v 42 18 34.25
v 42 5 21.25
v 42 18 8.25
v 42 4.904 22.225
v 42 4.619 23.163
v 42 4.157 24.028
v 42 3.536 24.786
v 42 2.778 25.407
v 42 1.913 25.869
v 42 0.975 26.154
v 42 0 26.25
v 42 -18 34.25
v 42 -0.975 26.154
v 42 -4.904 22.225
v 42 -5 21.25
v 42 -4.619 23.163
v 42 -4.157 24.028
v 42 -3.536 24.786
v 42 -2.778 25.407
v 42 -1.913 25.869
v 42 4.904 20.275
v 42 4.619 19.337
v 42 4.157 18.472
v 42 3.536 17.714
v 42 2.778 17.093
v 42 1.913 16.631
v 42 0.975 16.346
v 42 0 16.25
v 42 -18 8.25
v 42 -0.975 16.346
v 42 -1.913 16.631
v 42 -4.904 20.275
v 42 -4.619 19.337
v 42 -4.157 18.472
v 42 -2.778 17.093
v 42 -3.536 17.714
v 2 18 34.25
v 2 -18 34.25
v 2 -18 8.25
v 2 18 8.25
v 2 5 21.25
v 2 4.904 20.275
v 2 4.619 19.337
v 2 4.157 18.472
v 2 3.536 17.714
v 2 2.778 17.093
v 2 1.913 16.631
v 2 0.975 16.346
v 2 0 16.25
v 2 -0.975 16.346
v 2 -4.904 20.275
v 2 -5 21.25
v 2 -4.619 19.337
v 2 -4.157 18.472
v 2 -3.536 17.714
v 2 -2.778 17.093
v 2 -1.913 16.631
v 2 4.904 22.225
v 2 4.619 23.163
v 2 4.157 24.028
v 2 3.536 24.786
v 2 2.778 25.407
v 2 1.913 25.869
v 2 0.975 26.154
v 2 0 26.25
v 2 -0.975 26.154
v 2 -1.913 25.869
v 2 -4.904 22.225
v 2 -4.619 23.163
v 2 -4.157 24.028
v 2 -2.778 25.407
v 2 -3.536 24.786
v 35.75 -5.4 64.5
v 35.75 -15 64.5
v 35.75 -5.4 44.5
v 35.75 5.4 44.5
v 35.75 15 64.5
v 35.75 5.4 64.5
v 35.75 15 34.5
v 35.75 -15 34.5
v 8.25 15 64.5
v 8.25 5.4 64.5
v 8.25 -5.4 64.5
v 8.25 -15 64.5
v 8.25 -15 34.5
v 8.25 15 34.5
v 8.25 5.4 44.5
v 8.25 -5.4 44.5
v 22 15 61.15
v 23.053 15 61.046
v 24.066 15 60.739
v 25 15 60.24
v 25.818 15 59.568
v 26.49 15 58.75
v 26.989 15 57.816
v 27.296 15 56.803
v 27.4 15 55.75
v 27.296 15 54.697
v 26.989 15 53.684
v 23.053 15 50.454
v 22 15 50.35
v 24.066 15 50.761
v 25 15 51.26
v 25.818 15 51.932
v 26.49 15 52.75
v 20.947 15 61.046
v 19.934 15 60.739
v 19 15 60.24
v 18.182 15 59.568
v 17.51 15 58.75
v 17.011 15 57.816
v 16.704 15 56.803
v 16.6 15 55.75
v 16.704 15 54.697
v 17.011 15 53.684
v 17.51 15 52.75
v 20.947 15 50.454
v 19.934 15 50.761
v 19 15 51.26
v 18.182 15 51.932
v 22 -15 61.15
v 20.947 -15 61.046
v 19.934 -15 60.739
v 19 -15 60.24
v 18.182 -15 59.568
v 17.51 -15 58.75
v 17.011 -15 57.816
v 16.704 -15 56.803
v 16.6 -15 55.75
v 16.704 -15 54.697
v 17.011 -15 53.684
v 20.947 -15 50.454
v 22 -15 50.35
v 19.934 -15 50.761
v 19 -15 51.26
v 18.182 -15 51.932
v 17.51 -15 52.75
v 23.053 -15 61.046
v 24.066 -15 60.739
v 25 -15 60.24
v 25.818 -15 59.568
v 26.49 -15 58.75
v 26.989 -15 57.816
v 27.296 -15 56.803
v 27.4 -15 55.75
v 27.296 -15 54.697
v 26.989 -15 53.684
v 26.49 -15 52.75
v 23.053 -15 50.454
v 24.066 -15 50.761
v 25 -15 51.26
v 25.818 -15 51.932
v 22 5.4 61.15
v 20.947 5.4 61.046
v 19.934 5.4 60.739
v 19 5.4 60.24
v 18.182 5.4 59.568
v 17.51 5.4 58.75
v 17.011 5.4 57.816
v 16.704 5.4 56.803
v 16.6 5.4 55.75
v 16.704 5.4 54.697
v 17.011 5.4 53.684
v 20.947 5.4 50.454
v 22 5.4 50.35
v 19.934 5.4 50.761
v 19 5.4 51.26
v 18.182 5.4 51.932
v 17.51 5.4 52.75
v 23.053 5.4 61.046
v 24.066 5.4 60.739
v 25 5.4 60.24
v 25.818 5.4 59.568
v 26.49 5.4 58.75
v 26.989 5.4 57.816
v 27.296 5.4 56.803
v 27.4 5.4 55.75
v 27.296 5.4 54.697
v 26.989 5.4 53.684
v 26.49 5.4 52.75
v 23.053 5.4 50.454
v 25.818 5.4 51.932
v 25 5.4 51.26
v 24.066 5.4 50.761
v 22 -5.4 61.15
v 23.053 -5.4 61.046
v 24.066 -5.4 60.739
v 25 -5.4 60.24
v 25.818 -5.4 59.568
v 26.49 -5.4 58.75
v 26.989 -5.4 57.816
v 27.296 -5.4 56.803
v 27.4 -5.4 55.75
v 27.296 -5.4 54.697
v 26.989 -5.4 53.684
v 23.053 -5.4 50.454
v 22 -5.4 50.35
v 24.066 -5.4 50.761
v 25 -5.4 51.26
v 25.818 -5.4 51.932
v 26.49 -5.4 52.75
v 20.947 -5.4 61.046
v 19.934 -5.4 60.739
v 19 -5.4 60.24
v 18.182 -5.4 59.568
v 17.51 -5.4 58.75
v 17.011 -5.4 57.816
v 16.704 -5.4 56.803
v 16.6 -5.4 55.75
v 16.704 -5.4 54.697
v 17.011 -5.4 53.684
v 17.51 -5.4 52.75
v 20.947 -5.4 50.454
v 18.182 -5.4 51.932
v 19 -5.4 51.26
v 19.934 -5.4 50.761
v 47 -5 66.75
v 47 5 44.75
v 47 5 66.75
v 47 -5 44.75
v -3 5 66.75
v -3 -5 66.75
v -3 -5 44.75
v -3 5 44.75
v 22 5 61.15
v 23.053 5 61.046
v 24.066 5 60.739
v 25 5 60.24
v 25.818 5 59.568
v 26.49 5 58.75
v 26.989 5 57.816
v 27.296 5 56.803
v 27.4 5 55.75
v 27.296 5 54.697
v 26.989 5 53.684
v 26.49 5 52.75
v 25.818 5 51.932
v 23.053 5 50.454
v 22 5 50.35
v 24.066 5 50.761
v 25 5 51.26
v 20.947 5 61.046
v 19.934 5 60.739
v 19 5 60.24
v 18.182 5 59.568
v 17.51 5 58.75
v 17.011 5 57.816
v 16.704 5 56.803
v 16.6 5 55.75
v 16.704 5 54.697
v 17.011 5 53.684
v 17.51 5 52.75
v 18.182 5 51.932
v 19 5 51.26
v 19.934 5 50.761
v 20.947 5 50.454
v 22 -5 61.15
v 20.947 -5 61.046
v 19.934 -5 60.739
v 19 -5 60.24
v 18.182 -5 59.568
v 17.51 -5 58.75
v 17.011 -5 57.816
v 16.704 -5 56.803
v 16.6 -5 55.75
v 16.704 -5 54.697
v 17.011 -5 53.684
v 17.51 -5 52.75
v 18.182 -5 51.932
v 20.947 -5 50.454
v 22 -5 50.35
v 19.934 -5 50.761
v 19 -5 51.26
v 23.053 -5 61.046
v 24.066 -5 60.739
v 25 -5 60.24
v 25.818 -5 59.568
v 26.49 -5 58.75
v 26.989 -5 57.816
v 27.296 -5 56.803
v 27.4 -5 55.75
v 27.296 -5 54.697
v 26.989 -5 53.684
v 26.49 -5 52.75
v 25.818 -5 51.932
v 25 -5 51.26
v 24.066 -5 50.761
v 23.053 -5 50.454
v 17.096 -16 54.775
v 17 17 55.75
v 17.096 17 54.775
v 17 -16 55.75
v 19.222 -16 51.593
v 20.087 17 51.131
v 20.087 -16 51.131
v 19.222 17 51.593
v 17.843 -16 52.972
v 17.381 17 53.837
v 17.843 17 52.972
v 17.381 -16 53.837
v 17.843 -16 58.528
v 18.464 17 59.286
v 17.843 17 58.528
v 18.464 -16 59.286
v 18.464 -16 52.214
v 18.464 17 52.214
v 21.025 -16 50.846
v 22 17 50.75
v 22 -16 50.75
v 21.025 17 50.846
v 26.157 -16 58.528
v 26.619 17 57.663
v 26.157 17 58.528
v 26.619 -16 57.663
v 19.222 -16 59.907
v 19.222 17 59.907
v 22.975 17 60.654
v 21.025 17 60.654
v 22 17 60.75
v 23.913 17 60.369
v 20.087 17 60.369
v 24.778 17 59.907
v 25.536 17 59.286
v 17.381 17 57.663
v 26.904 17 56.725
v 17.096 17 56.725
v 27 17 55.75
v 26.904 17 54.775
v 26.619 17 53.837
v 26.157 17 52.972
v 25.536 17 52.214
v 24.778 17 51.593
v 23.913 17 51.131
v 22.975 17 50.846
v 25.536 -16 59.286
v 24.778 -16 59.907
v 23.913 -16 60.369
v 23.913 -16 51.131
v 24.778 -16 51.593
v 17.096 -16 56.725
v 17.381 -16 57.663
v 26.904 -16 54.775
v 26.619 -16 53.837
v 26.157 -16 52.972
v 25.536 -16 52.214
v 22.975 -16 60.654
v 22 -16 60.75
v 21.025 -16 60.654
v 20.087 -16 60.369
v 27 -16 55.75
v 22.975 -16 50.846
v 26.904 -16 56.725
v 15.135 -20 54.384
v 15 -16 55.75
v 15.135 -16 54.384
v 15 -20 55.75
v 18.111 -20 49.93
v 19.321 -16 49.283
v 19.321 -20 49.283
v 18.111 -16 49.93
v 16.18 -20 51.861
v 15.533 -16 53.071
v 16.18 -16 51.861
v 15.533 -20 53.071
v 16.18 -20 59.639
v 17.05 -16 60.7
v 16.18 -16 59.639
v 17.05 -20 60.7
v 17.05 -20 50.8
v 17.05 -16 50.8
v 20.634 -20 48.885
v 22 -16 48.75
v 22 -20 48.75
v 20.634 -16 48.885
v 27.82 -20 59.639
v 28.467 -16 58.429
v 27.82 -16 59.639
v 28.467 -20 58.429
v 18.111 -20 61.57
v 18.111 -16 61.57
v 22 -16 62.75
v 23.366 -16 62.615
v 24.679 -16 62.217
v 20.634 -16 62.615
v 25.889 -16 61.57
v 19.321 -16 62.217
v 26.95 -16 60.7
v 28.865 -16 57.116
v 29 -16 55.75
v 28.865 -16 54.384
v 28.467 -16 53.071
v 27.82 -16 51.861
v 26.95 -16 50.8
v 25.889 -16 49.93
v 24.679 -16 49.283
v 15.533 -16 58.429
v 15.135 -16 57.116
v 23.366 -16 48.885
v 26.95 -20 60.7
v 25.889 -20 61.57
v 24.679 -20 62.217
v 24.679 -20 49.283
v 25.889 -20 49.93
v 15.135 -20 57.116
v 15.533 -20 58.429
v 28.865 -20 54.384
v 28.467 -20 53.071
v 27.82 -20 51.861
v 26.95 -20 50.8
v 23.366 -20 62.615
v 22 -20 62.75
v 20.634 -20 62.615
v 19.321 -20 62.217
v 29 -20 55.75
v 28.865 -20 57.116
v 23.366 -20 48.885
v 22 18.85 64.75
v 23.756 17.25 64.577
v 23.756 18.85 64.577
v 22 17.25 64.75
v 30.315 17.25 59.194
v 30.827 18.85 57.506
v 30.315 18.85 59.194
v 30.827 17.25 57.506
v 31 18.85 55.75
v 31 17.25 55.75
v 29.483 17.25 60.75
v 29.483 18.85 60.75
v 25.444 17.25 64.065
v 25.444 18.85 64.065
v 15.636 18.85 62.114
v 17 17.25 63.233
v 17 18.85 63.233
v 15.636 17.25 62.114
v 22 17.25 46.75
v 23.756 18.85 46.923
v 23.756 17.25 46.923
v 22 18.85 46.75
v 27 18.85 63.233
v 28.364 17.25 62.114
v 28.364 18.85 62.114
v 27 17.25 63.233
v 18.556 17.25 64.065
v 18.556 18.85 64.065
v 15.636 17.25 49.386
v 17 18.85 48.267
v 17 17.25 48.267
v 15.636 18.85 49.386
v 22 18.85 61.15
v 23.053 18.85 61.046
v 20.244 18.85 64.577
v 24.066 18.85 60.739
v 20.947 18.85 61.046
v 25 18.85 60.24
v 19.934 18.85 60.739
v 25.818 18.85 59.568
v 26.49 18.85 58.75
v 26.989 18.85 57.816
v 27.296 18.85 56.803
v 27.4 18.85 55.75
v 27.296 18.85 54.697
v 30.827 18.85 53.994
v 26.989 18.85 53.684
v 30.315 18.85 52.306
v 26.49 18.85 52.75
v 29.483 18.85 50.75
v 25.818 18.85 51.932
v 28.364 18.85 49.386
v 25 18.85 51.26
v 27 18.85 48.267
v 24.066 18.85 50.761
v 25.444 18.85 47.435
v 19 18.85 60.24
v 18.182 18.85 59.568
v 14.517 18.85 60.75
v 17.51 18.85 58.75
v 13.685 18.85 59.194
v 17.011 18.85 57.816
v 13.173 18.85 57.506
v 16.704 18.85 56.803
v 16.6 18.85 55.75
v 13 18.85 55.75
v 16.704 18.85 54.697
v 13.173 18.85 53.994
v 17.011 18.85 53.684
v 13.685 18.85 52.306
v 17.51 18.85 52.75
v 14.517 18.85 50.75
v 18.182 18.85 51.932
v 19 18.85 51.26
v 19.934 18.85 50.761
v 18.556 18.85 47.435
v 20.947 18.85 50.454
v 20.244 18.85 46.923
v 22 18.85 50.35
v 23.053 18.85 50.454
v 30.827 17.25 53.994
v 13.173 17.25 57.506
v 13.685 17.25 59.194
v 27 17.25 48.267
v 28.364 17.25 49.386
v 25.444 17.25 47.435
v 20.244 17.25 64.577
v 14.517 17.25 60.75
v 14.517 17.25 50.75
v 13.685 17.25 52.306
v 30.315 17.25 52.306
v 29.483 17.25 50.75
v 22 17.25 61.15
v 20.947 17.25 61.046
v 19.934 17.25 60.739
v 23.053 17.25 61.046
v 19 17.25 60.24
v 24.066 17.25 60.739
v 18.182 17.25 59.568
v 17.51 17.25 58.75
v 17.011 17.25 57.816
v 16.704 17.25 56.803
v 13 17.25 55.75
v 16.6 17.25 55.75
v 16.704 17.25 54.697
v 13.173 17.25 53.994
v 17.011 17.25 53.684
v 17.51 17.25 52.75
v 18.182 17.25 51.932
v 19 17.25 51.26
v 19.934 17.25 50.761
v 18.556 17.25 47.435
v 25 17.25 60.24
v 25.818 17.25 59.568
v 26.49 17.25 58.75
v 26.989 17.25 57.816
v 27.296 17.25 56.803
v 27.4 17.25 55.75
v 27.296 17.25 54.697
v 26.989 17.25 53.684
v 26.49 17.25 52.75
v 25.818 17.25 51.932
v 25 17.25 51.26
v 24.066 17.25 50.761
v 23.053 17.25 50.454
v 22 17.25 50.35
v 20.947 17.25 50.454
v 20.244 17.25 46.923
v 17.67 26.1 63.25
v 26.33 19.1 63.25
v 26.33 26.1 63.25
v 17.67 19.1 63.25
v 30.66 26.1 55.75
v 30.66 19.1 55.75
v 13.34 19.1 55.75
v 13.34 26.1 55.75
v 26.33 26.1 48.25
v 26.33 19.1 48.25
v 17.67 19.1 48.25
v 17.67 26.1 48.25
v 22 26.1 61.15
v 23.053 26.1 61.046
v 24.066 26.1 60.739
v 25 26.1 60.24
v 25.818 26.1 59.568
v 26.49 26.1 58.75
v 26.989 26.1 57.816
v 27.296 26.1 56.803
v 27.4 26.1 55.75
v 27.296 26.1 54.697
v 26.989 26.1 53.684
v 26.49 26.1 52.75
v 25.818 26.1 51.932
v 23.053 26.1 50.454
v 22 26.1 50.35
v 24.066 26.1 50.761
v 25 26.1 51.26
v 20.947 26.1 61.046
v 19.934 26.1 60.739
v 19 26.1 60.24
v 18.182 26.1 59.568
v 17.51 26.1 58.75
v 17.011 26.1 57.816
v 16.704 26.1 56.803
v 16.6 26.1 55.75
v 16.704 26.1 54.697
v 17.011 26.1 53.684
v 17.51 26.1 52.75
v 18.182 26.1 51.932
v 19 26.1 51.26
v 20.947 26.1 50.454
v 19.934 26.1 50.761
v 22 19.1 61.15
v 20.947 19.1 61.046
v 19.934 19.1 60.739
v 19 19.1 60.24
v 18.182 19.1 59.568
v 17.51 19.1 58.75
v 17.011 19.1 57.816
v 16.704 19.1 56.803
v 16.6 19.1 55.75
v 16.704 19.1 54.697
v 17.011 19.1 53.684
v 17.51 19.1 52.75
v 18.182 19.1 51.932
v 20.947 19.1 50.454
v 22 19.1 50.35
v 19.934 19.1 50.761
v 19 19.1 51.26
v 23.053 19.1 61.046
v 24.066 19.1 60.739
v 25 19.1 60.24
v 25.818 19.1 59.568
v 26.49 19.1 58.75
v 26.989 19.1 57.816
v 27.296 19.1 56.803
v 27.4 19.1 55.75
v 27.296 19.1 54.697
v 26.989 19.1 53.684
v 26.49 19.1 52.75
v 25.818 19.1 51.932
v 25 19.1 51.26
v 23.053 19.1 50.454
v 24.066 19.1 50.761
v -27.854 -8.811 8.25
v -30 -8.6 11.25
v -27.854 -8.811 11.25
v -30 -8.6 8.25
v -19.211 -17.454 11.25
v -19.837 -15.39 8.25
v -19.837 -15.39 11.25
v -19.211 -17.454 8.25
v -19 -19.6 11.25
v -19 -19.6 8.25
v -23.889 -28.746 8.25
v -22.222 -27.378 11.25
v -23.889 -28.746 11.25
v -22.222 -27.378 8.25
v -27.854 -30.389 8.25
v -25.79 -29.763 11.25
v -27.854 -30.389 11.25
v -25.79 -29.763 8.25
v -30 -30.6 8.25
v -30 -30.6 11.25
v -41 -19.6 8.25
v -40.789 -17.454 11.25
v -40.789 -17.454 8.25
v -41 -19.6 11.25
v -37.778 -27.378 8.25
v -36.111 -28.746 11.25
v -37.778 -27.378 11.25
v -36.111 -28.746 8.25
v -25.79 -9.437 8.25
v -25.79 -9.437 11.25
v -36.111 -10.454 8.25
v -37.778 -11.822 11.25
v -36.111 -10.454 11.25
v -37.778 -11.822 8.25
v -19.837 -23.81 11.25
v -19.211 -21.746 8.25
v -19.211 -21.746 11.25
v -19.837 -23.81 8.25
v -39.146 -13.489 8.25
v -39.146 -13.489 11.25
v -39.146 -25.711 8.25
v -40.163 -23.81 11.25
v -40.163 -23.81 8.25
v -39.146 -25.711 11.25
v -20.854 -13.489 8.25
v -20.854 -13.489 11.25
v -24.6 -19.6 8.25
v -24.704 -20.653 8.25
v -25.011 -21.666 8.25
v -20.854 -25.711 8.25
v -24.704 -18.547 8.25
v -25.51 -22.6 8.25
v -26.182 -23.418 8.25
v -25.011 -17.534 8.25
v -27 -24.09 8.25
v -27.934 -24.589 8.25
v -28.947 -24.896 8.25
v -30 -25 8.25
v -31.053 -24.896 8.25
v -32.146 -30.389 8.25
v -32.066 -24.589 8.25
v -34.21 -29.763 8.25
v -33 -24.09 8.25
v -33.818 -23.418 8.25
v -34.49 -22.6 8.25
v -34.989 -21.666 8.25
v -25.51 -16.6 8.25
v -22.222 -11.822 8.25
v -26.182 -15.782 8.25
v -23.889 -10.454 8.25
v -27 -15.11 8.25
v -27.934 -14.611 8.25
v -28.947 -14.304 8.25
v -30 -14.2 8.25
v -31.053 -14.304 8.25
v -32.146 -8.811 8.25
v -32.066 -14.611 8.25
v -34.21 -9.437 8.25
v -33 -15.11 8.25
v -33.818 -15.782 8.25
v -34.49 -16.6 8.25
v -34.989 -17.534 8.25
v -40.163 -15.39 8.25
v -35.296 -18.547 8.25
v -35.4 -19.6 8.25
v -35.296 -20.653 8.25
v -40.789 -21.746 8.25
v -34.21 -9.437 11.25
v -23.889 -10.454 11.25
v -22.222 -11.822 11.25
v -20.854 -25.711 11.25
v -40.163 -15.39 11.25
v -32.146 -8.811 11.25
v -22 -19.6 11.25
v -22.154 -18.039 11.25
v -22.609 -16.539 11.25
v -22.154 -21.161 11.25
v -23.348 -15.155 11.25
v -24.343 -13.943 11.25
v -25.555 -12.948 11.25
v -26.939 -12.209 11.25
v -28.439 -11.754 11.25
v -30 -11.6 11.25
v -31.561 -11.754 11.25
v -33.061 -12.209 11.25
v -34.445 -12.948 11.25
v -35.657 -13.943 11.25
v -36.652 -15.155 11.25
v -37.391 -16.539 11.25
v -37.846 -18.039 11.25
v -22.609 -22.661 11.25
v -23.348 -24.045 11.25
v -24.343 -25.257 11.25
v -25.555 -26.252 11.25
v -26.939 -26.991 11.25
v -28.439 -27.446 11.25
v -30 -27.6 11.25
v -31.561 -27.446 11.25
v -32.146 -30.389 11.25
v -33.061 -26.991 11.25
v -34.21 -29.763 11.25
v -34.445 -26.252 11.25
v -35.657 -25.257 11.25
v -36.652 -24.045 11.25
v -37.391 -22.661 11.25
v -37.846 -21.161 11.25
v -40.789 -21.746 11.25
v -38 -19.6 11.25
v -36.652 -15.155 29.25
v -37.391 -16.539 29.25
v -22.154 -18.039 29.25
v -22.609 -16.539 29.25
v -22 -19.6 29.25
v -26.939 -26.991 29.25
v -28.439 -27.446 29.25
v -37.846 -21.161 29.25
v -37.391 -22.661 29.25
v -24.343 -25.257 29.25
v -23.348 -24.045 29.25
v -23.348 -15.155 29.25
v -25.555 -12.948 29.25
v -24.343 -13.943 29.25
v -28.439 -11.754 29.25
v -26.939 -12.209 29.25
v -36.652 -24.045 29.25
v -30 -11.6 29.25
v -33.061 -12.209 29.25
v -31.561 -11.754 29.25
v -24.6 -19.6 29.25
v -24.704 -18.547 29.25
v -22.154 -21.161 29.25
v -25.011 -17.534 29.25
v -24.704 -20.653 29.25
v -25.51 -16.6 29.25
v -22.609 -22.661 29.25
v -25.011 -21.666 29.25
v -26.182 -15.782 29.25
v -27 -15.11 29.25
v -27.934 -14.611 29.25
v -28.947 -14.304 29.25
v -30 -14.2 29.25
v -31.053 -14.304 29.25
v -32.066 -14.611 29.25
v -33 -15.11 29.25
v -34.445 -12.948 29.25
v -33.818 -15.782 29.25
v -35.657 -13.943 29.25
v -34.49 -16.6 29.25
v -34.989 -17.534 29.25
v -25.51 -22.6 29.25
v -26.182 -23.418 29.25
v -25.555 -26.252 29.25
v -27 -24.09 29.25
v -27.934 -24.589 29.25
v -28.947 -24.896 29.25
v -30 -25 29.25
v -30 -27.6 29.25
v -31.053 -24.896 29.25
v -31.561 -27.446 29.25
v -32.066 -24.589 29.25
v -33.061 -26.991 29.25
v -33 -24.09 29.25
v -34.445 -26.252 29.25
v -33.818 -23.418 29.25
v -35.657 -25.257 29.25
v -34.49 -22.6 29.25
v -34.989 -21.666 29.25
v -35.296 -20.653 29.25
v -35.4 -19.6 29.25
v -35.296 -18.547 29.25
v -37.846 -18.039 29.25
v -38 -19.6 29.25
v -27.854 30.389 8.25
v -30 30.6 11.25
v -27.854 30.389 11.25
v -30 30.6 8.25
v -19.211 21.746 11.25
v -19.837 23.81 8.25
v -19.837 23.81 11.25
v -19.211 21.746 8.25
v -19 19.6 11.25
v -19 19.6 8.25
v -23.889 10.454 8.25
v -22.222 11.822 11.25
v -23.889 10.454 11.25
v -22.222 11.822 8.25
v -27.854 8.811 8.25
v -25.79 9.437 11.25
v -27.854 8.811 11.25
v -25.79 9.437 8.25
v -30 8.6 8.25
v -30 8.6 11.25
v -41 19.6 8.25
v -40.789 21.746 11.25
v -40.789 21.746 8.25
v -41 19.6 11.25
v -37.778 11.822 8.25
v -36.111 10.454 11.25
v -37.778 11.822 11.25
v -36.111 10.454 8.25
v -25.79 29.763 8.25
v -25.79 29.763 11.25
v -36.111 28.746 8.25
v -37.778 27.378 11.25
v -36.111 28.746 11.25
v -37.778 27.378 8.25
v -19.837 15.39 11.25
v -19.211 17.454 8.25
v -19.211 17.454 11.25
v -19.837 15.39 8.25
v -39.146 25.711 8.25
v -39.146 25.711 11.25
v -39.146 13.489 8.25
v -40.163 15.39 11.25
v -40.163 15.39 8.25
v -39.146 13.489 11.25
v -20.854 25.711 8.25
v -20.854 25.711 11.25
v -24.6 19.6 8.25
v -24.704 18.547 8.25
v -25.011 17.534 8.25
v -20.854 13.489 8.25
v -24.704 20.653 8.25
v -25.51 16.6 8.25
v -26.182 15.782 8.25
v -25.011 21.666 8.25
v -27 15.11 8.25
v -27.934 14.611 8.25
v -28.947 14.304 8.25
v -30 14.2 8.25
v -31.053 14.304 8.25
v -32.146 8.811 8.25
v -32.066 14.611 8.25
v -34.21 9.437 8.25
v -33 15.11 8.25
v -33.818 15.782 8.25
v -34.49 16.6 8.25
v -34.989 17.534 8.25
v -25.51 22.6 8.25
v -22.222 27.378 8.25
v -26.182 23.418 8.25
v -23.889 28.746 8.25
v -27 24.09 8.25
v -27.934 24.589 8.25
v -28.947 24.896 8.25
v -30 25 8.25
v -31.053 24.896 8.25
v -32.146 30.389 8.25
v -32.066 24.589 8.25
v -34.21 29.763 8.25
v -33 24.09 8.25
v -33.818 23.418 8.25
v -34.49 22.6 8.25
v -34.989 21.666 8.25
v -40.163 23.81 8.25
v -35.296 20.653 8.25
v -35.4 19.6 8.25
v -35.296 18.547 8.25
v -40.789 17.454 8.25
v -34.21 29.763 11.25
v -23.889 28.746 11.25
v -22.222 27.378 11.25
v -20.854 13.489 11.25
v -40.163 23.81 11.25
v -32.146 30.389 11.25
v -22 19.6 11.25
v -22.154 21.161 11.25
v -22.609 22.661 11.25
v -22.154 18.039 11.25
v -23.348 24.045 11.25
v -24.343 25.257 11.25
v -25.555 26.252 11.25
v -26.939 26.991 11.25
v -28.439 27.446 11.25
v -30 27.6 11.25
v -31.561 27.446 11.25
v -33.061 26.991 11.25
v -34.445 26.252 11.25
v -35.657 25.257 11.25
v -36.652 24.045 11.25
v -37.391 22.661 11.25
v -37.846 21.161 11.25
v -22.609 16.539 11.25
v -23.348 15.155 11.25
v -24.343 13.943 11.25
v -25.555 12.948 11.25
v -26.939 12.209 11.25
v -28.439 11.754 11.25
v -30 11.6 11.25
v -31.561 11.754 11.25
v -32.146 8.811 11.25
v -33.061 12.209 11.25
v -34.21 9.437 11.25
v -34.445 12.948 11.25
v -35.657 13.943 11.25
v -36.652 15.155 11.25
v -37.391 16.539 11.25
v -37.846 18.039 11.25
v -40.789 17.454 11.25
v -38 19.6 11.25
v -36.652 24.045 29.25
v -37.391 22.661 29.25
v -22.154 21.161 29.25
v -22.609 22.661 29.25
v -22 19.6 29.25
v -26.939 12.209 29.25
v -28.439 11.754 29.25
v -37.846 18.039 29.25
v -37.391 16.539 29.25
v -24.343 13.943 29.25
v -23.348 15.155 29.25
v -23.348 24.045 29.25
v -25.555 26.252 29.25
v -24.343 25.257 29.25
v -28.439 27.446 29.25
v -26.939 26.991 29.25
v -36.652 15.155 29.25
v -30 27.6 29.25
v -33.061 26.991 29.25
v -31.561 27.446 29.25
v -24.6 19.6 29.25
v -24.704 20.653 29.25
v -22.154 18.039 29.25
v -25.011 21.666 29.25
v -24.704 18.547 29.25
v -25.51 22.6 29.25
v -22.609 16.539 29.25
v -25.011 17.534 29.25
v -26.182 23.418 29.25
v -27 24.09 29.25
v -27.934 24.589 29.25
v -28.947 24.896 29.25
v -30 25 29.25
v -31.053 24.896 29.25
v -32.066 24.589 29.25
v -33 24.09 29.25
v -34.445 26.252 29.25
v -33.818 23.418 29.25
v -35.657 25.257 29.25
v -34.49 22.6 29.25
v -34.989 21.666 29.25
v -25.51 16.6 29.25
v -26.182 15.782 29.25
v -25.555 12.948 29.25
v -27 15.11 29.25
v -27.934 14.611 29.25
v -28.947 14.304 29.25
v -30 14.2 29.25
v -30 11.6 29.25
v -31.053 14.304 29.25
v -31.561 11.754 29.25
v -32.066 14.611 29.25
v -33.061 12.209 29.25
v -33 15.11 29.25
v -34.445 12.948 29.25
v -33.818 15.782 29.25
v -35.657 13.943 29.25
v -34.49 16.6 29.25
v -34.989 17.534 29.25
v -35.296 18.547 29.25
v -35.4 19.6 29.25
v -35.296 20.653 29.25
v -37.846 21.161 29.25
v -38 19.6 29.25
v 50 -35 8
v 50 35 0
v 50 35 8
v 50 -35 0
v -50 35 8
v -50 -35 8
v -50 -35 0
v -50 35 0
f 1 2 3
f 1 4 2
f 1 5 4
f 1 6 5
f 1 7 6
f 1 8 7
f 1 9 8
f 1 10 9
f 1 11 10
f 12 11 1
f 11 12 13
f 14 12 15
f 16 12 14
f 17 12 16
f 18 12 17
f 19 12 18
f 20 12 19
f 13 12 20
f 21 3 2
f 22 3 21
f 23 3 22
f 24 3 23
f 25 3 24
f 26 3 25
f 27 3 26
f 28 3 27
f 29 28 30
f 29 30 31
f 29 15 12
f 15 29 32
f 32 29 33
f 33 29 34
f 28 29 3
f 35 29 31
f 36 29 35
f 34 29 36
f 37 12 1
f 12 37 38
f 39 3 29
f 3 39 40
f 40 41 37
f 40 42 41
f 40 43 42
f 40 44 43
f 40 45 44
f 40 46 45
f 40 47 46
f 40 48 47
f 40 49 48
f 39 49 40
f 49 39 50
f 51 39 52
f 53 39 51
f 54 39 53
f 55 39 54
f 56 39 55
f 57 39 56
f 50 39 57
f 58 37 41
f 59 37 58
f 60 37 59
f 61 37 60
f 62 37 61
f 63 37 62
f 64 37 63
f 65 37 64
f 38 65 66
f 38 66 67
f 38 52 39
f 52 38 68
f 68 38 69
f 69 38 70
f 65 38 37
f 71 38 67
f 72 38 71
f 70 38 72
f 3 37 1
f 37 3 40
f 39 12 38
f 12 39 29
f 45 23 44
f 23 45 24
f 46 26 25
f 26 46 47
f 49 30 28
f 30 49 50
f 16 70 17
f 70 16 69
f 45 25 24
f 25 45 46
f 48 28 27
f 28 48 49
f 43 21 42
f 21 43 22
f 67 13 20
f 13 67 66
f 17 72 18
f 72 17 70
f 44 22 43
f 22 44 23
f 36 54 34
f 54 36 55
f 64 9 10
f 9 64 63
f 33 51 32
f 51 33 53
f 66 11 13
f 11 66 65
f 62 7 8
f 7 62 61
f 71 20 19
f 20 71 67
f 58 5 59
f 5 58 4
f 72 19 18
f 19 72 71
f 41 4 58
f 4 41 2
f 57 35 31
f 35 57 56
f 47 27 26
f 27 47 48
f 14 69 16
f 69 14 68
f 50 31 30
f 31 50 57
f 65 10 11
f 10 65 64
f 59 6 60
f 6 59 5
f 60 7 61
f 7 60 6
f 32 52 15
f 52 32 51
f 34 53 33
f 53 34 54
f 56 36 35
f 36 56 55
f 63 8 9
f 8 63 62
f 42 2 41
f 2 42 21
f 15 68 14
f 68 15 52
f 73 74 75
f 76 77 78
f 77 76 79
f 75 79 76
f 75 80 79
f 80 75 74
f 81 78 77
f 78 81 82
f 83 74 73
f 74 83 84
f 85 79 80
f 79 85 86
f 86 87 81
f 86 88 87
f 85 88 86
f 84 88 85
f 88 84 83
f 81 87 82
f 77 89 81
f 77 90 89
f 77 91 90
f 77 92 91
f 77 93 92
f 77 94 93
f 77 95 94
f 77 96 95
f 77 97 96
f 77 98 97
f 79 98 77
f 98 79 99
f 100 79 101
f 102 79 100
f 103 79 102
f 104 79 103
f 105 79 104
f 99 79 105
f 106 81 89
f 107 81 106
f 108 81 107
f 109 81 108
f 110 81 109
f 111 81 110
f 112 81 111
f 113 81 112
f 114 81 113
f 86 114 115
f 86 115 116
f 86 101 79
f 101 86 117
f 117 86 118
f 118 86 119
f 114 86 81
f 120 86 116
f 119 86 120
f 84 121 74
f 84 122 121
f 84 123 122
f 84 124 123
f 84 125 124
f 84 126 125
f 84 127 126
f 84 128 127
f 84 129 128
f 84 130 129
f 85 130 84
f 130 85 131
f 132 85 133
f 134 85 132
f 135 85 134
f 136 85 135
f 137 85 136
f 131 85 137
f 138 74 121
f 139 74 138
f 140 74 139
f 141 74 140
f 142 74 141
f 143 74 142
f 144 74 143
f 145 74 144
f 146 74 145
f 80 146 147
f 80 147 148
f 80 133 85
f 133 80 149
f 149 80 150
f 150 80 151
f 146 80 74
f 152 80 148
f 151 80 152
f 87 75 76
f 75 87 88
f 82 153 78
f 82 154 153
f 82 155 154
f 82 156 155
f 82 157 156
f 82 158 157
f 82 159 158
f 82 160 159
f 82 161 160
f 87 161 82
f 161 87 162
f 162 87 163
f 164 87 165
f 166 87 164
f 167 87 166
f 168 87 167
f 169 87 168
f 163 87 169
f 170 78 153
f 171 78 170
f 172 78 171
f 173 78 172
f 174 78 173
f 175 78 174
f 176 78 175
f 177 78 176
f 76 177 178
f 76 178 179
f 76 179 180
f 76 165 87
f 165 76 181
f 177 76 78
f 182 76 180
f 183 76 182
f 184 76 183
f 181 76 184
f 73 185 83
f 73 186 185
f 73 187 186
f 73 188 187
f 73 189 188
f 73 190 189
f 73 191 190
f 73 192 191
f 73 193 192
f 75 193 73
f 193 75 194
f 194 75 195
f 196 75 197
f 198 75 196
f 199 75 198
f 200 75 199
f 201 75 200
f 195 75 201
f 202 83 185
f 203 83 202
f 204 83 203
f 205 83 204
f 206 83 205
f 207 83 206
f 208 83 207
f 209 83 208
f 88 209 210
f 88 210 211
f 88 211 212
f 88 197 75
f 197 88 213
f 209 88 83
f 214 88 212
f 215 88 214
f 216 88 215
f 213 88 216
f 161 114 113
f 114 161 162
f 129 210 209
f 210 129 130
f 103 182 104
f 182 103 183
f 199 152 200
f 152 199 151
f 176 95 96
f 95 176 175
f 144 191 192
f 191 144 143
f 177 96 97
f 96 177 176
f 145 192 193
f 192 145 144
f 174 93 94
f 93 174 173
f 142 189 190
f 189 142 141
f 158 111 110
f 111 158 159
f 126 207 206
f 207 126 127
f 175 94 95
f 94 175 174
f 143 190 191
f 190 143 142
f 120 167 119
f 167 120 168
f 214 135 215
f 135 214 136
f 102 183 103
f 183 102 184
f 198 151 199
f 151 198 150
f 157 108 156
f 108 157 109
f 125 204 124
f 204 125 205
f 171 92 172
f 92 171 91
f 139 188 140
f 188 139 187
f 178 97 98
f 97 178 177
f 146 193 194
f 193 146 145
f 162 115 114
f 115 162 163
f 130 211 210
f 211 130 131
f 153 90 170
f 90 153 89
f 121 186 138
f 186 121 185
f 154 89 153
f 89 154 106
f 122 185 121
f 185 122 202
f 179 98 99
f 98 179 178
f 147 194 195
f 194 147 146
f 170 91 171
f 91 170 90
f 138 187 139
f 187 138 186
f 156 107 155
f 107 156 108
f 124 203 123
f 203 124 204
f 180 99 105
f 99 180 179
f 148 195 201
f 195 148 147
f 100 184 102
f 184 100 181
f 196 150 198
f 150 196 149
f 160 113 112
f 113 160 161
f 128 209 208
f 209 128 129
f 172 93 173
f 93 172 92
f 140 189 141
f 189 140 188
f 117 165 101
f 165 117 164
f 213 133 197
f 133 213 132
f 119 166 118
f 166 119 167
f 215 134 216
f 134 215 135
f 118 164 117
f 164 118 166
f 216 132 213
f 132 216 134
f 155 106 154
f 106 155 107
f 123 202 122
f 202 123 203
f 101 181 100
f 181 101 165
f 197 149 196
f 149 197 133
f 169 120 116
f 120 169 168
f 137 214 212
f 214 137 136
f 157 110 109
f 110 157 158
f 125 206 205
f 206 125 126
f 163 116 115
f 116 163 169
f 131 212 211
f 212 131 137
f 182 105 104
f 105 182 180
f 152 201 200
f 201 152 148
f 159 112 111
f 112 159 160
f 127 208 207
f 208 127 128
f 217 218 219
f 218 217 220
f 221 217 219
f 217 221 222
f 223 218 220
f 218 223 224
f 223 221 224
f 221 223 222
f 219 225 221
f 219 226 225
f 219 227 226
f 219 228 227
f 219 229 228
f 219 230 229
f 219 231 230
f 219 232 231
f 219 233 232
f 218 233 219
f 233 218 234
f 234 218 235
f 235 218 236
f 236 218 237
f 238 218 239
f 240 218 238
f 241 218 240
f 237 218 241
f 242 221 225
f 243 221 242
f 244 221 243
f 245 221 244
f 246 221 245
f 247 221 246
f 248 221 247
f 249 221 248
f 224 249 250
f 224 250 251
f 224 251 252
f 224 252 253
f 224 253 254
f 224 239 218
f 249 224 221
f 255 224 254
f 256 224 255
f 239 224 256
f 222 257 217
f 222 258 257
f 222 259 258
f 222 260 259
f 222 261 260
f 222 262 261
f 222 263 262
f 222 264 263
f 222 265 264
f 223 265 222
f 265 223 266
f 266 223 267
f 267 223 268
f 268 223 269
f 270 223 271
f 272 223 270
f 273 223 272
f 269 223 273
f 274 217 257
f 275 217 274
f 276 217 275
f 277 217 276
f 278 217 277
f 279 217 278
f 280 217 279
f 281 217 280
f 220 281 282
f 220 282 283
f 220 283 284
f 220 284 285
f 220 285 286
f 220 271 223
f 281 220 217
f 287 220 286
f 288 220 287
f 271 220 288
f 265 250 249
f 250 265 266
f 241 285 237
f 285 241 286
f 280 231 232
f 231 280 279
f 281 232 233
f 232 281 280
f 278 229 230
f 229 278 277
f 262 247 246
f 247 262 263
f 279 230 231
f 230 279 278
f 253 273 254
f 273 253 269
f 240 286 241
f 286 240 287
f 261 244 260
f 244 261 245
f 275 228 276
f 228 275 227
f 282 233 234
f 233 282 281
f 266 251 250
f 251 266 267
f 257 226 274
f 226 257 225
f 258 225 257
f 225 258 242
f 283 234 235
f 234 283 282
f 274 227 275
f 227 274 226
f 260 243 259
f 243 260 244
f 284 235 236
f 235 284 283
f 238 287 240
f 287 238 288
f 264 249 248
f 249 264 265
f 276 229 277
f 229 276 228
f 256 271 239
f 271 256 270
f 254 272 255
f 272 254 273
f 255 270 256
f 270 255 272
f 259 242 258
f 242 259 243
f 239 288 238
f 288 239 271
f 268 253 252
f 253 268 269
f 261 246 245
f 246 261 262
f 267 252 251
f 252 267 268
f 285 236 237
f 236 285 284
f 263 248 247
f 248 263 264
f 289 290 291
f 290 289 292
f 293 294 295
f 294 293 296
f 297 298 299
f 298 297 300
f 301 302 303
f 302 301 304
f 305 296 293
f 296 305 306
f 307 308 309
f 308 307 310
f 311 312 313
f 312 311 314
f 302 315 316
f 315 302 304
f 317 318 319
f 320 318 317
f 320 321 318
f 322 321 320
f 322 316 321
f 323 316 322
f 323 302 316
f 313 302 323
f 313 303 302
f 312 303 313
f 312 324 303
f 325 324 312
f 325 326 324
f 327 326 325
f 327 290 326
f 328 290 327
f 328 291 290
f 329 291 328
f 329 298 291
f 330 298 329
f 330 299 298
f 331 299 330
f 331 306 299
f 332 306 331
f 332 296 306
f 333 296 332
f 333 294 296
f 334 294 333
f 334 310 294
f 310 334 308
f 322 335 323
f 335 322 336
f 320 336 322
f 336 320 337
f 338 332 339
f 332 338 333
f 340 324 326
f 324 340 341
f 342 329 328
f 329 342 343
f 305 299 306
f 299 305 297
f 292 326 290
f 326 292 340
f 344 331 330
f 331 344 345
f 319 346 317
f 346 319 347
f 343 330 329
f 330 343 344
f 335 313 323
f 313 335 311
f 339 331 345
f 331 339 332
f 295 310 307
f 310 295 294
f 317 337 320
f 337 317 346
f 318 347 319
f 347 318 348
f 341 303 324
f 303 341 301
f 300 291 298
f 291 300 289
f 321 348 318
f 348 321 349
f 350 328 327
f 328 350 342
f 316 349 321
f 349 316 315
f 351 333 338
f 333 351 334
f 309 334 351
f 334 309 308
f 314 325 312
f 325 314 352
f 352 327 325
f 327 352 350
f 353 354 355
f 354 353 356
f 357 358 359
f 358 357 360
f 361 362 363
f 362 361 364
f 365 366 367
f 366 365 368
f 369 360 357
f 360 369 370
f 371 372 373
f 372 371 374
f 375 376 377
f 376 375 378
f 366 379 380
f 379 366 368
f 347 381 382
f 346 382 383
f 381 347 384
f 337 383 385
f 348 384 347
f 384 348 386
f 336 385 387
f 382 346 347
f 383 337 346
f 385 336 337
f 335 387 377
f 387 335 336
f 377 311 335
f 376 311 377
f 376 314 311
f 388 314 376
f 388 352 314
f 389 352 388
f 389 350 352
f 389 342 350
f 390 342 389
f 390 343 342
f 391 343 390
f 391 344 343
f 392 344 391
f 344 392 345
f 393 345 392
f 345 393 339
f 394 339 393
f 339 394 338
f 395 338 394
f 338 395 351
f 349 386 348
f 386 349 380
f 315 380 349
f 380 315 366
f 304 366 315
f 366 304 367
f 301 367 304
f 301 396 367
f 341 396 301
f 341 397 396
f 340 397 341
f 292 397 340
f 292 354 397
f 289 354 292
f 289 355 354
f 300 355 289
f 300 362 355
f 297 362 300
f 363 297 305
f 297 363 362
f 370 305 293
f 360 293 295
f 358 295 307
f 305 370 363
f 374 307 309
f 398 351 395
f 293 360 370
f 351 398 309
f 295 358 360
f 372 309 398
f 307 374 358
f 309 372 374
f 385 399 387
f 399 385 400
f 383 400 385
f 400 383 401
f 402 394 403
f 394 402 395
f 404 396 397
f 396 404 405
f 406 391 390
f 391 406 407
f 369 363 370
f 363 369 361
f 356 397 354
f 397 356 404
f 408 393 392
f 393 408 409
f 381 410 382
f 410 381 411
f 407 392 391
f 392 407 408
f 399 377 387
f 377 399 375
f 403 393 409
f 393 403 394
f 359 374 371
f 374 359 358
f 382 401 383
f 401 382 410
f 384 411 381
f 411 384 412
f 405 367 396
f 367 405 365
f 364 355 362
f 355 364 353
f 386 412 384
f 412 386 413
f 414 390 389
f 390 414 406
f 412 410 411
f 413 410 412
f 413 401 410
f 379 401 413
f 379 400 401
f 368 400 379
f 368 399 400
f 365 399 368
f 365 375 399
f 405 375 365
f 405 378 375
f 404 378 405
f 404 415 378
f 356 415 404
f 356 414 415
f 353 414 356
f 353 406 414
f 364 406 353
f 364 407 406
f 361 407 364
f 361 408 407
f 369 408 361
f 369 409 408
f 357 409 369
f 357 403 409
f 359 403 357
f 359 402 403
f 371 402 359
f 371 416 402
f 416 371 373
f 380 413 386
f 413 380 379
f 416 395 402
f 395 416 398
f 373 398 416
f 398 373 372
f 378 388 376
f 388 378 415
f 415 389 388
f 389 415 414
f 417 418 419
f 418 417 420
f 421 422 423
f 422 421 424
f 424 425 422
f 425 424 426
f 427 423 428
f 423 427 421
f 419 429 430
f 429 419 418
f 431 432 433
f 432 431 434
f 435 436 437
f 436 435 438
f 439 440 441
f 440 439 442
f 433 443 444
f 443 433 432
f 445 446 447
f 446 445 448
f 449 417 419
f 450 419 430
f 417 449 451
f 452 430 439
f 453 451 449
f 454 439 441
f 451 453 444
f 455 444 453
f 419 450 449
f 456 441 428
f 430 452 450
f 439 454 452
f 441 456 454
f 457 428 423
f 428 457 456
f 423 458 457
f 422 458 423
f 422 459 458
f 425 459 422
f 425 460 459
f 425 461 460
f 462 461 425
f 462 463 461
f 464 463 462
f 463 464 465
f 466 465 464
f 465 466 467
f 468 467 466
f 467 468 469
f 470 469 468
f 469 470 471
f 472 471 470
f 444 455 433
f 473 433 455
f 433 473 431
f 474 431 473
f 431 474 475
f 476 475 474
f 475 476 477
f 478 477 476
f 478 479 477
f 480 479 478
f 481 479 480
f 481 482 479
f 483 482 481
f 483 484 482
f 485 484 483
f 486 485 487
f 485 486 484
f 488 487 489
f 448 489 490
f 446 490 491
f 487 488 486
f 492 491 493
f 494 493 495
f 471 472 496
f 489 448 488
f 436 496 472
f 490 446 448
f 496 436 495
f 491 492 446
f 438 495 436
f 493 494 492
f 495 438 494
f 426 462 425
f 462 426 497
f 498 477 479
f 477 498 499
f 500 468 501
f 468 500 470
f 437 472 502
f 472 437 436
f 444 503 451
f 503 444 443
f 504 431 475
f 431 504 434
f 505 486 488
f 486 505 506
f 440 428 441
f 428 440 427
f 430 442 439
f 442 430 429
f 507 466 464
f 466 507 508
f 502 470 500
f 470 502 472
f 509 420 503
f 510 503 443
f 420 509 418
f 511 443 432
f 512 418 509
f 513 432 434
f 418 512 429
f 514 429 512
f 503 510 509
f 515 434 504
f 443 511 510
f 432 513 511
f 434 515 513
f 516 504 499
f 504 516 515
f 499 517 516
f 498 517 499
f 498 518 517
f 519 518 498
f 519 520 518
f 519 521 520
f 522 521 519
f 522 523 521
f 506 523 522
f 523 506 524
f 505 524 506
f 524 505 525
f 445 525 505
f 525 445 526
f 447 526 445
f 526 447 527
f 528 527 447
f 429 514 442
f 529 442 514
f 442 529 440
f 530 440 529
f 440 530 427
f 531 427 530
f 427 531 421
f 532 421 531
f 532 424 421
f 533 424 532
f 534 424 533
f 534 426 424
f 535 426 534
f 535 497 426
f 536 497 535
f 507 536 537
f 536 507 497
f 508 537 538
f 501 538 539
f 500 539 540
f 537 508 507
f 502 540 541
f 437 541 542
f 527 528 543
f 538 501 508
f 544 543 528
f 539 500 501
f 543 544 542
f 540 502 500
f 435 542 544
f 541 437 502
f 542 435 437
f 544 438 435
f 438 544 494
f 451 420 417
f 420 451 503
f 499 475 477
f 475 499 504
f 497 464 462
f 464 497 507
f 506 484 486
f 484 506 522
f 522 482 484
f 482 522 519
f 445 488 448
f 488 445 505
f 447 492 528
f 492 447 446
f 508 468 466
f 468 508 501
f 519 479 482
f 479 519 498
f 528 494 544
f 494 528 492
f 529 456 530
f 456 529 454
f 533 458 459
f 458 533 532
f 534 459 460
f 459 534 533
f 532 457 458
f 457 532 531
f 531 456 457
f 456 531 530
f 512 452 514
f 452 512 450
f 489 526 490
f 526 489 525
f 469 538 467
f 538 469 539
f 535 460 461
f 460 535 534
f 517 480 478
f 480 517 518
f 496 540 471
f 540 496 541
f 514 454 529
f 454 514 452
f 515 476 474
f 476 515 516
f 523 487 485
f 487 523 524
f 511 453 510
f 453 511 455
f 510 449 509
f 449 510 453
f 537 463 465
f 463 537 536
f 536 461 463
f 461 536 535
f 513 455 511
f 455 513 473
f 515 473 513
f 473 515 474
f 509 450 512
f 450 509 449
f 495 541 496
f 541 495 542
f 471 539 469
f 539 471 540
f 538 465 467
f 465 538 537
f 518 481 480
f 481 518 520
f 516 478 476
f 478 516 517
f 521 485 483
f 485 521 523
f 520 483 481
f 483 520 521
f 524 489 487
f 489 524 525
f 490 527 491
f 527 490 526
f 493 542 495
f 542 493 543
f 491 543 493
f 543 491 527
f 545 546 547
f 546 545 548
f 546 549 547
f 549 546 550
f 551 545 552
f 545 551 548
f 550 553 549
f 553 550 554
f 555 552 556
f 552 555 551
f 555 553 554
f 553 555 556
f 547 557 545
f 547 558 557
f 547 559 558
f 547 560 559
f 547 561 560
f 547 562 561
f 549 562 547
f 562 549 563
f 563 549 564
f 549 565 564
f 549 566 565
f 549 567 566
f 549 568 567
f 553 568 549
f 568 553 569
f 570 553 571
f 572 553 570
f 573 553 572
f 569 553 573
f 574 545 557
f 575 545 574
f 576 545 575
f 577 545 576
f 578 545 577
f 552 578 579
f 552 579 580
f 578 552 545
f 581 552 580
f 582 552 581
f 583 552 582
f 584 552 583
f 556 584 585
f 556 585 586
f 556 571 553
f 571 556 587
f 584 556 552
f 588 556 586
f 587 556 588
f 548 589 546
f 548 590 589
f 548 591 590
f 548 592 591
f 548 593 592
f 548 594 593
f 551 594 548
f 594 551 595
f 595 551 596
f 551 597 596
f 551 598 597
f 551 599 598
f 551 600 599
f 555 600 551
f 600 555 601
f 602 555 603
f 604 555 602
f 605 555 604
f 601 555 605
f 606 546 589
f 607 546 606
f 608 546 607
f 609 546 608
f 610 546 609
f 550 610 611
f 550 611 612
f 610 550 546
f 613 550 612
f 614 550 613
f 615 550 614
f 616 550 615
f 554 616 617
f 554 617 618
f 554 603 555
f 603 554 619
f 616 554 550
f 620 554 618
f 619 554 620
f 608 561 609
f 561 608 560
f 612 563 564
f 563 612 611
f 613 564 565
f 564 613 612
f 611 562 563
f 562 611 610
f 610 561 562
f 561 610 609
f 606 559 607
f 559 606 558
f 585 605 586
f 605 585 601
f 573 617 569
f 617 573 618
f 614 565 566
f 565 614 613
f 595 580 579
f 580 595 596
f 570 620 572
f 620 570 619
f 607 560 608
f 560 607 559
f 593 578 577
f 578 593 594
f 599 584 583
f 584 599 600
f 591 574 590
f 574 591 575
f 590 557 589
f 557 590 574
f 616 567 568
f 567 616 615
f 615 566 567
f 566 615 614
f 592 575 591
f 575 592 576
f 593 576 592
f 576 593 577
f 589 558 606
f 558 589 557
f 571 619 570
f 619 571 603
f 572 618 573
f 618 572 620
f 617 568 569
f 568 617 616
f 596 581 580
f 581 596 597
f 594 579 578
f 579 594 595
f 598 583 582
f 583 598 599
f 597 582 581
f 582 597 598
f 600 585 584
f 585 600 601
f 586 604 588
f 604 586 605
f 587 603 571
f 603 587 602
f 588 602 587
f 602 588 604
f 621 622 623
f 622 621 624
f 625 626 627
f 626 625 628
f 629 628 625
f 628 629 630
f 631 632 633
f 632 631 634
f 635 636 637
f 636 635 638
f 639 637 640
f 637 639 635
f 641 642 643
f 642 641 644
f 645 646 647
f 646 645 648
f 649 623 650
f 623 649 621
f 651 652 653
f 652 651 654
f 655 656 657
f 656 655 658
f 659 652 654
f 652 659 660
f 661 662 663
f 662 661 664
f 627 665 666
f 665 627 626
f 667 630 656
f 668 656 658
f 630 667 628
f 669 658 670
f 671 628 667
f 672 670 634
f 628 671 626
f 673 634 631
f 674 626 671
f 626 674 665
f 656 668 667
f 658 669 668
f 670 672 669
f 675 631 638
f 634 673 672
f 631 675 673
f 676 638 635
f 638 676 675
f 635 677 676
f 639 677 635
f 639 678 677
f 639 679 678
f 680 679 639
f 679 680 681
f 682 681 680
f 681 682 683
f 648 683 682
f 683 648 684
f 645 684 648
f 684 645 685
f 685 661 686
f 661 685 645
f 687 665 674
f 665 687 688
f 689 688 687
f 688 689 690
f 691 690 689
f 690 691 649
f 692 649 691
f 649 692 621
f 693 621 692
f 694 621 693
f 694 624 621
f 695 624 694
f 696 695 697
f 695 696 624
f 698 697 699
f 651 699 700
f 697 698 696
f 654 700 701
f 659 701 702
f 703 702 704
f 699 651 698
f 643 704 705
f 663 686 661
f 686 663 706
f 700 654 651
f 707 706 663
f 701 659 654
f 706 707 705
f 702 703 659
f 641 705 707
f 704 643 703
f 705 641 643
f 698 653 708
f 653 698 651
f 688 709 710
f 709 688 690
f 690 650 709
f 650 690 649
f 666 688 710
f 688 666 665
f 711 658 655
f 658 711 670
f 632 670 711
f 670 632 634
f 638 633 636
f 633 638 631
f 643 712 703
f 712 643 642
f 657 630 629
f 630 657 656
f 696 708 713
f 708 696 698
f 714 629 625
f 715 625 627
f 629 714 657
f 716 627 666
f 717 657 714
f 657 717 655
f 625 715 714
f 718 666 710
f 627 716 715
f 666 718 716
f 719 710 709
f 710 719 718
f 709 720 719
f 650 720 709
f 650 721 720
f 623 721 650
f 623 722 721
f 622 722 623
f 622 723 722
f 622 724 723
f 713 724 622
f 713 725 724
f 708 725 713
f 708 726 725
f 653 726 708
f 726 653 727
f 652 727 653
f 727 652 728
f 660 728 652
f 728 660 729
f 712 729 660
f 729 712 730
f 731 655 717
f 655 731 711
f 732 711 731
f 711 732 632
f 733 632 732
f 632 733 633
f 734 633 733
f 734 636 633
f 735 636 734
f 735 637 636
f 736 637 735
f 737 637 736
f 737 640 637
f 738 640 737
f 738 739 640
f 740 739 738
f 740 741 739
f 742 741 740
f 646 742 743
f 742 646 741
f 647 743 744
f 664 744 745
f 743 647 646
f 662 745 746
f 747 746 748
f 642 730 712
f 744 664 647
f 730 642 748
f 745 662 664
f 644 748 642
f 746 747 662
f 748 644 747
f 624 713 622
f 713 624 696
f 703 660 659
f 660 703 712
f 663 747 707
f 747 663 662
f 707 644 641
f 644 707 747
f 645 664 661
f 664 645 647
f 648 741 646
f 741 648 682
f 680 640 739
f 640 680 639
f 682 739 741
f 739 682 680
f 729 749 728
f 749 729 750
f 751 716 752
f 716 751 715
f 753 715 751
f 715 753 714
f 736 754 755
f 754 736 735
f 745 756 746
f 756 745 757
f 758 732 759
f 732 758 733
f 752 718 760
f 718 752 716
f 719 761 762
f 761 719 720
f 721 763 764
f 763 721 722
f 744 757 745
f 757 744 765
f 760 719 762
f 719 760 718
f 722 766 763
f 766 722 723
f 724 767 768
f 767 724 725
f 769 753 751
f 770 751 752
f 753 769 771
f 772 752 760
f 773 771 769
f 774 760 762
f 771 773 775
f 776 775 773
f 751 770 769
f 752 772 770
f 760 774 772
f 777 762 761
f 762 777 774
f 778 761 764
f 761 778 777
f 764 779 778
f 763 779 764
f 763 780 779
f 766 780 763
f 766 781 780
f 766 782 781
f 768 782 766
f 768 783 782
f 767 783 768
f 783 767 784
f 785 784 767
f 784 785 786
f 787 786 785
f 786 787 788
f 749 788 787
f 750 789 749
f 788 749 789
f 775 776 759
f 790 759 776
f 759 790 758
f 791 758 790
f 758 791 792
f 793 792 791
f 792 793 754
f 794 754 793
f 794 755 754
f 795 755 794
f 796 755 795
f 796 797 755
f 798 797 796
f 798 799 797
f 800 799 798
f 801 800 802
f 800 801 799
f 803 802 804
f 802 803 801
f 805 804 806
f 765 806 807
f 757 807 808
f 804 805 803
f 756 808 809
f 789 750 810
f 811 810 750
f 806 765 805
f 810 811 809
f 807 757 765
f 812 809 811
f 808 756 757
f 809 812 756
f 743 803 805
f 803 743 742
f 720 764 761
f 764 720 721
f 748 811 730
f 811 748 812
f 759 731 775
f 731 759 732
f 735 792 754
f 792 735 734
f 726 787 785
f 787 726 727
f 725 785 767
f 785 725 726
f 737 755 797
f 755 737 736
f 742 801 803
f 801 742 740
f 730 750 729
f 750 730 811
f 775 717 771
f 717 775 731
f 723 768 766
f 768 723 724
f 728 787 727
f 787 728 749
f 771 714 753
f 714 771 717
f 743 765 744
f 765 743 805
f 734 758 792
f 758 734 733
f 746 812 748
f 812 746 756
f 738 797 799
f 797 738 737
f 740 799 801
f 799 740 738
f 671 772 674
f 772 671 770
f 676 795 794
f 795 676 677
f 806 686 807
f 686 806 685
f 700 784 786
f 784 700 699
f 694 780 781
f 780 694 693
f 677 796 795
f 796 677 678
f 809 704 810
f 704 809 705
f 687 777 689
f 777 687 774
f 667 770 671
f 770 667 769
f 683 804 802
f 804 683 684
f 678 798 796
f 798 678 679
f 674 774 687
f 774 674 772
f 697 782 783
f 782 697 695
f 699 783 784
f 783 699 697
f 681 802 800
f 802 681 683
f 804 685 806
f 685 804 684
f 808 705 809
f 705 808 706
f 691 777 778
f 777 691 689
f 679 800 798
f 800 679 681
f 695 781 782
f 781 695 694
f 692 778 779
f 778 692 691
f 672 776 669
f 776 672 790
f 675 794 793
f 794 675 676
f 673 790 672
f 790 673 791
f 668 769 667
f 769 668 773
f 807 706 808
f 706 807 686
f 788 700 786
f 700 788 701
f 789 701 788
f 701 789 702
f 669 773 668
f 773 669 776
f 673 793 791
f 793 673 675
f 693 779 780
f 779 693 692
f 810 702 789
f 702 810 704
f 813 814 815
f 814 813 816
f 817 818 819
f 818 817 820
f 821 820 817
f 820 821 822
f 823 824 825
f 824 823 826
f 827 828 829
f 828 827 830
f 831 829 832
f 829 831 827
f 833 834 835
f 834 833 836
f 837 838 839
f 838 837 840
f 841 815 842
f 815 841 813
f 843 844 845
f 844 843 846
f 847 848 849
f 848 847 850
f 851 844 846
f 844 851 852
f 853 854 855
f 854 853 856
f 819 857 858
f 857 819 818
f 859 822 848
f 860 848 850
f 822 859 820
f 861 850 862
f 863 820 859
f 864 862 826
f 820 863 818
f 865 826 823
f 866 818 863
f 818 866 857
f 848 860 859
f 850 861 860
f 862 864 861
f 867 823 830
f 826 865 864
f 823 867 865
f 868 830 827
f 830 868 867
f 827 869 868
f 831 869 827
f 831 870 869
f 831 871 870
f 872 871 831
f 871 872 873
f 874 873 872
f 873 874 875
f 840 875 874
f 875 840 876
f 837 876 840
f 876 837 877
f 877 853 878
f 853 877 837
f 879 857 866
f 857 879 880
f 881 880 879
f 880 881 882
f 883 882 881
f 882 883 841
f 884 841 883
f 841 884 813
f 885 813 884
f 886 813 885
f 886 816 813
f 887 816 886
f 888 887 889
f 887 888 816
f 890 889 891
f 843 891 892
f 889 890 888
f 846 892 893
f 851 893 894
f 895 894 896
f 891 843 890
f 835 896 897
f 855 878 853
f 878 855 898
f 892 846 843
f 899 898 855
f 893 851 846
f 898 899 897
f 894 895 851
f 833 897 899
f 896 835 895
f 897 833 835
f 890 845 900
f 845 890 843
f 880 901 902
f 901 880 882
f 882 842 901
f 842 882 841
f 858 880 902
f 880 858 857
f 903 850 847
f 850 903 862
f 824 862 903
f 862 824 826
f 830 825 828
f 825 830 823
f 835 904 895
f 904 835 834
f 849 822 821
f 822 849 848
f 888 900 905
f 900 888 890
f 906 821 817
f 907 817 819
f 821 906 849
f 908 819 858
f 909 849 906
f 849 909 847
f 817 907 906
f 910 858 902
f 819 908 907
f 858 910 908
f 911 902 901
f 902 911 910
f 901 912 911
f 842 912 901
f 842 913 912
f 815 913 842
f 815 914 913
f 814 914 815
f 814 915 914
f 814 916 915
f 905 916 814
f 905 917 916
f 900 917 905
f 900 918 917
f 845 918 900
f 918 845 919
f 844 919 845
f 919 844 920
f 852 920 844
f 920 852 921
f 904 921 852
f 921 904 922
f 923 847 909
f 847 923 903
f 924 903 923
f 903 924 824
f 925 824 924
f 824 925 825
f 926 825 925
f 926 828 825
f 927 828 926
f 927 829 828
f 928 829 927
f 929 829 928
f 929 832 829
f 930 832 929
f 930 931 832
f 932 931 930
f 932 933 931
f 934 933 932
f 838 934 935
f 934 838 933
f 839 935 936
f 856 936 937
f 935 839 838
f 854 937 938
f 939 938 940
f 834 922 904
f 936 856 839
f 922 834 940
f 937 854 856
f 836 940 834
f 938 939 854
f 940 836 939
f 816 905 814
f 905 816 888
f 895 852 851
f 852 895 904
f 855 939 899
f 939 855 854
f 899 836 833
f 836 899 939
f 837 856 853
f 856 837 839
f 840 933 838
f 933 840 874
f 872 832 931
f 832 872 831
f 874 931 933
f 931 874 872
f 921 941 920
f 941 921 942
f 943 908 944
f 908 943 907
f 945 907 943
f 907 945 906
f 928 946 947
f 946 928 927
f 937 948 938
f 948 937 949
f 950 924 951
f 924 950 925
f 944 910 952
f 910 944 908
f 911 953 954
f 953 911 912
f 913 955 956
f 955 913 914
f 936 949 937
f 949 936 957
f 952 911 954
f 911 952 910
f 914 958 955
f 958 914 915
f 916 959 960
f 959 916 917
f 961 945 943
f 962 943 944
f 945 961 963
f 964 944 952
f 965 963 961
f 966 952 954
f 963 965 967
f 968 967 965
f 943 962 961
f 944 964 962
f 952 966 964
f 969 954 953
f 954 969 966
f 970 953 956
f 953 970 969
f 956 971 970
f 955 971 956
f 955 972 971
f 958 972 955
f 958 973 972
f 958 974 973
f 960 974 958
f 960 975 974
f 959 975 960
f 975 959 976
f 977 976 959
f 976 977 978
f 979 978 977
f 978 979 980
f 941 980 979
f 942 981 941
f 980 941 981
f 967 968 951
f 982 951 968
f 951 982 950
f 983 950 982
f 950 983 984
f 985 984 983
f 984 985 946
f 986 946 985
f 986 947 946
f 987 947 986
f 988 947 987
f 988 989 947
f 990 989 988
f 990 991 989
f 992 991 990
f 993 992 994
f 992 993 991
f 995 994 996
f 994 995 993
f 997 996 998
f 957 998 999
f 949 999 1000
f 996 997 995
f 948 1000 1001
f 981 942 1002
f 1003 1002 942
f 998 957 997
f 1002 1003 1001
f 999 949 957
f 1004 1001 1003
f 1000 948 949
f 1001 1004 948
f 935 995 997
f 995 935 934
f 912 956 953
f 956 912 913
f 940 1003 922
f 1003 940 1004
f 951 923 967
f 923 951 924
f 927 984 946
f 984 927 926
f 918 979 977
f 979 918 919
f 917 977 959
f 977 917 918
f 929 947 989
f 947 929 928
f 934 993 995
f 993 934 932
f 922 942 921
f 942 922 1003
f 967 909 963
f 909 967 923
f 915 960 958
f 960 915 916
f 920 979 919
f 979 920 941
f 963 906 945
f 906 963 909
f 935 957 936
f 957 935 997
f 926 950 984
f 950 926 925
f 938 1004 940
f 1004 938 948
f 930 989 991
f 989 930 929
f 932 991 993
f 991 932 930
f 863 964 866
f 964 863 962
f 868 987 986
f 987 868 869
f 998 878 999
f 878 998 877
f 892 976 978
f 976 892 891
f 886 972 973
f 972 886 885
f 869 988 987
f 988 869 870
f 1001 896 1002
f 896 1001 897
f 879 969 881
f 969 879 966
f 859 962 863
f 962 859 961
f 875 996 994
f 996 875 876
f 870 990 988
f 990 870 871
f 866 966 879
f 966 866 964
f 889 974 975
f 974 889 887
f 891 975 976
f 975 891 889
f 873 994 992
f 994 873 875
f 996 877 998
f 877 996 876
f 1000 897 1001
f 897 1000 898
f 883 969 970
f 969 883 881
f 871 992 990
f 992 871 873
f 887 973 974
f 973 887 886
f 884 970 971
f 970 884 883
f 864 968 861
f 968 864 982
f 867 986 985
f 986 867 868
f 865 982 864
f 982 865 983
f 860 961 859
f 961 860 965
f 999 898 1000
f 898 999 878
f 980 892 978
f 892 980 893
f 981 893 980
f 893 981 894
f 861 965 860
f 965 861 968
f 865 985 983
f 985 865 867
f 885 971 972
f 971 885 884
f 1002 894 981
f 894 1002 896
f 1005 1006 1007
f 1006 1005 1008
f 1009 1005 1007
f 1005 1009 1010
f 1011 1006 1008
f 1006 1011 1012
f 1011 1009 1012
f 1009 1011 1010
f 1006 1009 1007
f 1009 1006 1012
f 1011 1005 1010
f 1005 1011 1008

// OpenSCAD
$fn = 32;

// ------------------------------------------------------------------------
// Indexing jig: plate 100 x 70 mm, pin d10
// Every part is its own module, assembly() places every instance.
// ------------------------------------------------------------------------

// --- part 1 ---
module jig_plate() {
  difference() {
    translate([-50, -35, 0]) cube([100, 70, 8]);
  }
}

// --- part 2 ---
module locator_block() {
  difference() {
    translate([-20, -18, 0]) cube([40, 36, 26]);
    translate([0, 0, 13]) rotate([0, 90, 0]) cylinder(h = 42, d = 10, center = true);
  }
}

// --- part 3 ---
module index_fork() {
  difference() {
    translate([-13.75, -15, 0]) cube([27.5, 30, 30]);
    translate([-14.75, -5.4, 10]) cube([29.5, 10.8, 21]);
    translate([0, 0, 21.25]) rotate([90, 0, 0]) cylinder(h = 32, d = 10.8, center = true);
  }
}

// --- part 4 ---
module index_arm() {
  difference() {
    translate([-25, -5, 0]) cube([50, 10, 22]);
    translate([0, 0, 11]) rotate([90, 0, 0]) cylinder(h = 12, d = 10.8, center = true);
  }
}

// --- part 5 ---
module index_pin() {
  rotate([0, 90, 0]) cylinder(h = 34, d = 10, center = true);
  translate([-20, 0, 0]) rotate([0, 90, 0]) cylinder(h = 4, d = 14);
}

// --- part 6 ---
module pin_washer() {
  difference() {
      translate([0, 0, 0]) cylinder(h = 1.6, d = 18);
      translate([0, 0, -1]) cylinder(h = 3.6, d = 10.8);
    }
}

// --- part 7 ---
module lock_nut() {
  difference() {
    linear_extrude(height = 7) polygon(points = [[8.66, 0], [4.33, 7.5], [-4.33, 7.5], [-8.66, 0], [-4.33, -7.5], [4.33, -7.5]]);
    translate([0, 0, -1]) cylinder(h = 9, d = 10.8);
  }
}

// --- part 8 ---
module guide_bush_a() {
  difference() {
    union() {
      cylinder(h = 3, d = 22);
      translate([0, 0, 3]) cylinder(h = 18, d = 16);
    }
    translate([0, 0, -1]) cylinder(h = 23, d = 10.8);
  }
}

// --- part 9 ---
module guide_bush_b() {
  difference() {
    union() {
      cylinder(h = 3, d = 22);
      translate([0, 0, 3]) cylinder(h = 18, d = 16);
    }
    translate([0, 0, -1]) cylinder(h = 23, d = 10.8);
  }
}

// --- assembly ---
module assembly() {
  color([0.80, 0.24, 0.20]) translate([0, 0, 0]) rotate([0, 0, 0]) jig_plate();
  color([0.20, 0.45, 0.75]) translate([22, 0, 8.25]) rotate([0, 0, 0]) locator_block();
  color([0.25, 0.62, 0.32]) translate([22, 0, 34.5]) rotate([0, 0, 0]) index_fork();
  color([0.92, 0.70, 0.18]) translate([22, 0, 44.75]) rotate([0, 0, 0]) index_arm();
  color([0.58, 0.35, 0.70]) translate([22, 0, 55.75]) rotate([0, 0, 90]) index_pin();
  color([0.16, 0.66, 0.66]) translate([22, 18.85, 55.75]) rotate([90, 0, 0]) pin_washer();
  color([0.85, 0.48, 0.18]) translate([22, 26.1, 55.75]) rotate([90, 0, 0]) lock_nut();
  color([0.55, 0.60, 0.65]) translate([-30, -19.6, 8.25]) rotate([0, 0, 0]) guide_bush_a();
  color([0.75, 0.30, 0.55]) translate([-30, 19.6, 8.25]) rotate([0, 0, 0]) guide_bush_b();
}

assembly();
